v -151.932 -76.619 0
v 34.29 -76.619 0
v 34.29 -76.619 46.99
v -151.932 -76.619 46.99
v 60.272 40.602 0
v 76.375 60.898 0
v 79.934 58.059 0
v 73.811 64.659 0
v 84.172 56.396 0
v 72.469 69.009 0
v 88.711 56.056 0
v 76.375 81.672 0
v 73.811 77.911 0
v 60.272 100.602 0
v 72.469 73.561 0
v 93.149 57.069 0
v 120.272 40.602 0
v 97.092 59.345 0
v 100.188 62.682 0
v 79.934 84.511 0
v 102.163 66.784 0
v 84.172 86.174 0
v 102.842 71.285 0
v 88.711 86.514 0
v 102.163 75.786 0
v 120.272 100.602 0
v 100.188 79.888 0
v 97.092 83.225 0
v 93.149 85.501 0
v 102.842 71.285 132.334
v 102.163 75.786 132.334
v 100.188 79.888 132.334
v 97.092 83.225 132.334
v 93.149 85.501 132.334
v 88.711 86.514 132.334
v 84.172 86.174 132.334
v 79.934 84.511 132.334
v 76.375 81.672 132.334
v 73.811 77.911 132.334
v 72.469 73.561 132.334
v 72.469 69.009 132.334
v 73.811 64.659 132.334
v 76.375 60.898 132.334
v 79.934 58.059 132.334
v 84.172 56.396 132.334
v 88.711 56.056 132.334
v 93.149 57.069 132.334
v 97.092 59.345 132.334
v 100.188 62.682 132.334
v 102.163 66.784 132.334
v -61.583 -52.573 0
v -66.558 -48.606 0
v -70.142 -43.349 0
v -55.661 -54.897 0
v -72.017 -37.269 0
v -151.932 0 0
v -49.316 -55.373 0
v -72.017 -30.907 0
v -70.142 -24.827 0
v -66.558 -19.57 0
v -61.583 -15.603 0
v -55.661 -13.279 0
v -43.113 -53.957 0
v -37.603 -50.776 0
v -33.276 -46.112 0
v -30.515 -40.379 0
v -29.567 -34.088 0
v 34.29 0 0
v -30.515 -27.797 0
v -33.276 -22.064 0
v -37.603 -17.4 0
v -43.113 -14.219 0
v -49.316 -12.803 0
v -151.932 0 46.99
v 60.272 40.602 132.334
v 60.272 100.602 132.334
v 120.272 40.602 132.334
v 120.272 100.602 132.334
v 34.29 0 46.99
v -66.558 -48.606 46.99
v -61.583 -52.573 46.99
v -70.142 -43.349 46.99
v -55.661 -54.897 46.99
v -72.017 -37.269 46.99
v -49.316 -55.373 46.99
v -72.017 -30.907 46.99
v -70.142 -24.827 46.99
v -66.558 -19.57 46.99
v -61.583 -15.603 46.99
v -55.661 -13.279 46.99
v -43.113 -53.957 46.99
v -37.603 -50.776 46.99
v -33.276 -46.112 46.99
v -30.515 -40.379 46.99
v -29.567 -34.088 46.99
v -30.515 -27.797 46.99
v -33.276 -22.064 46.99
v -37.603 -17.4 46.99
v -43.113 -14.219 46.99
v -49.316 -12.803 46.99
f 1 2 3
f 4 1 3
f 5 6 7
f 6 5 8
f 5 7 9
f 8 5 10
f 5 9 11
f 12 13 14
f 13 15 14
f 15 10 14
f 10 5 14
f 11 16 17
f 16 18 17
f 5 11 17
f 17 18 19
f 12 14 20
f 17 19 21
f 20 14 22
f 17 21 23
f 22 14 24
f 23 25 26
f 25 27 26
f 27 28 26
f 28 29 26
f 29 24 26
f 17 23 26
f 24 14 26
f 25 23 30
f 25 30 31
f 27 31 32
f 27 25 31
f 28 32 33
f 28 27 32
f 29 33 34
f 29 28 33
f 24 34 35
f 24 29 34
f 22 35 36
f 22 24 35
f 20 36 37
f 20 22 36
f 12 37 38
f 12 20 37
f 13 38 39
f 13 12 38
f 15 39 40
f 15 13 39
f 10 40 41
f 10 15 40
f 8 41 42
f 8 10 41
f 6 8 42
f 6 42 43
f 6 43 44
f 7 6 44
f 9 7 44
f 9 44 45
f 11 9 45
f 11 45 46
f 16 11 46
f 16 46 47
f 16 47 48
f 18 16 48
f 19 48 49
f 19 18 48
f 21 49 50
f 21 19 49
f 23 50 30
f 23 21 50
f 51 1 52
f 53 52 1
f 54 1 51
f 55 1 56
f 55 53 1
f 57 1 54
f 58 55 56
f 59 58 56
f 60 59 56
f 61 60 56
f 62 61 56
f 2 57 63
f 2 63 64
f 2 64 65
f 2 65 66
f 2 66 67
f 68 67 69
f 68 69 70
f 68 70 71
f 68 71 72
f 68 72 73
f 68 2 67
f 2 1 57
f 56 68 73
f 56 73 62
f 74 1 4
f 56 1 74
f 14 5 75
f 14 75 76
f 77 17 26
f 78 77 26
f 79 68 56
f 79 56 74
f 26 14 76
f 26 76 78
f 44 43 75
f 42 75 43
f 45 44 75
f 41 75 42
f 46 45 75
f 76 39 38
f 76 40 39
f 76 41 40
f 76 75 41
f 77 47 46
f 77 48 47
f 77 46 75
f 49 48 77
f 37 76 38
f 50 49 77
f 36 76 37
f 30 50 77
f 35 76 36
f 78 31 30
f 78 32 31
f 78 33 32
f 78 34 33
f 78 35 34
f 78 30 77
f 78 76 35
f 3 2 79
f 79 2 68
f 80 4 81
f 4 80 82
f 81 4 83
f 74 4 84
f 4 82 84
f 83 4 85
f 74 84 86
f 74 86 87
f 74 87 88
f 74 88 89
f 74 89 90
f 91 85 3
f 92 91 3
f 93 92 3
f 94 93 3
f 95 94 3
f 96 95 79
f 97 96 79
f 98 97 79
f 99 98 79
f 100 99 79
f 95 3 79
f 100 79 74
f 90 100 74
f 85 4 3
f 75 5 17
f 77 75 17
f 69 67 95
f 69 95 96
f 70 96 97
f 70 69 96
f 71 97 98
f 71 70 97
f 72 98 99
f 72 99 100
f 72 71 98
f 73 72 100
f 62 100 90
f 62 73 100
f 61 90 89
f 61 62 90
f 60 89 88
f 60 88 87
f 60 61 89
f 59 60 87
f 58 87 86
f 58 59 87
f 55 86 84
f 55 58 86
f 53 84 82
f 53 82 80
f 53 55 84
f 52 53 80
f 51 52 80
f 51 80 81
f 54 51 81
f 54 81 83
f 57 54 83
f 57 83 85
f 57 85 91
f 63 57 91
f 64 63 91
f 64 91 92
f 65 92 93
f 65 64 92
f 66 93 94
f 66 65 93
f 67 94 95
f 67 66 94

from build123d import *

# Parameters (mm, degrees)
F0_W     = 93.0038541555
F0_H     = 76.6185969114
F0_R     = 21.3443090391
F1_DEPTH = 46.99
F2_DEPTH = 34.29
F3_DEPTH = 58.928
F4_W     = 60
F4_H     = 60
F4_R     = 15.2716118789
F5_DEPTH = 132.334


with BuildPart() as f1:
    # F0 (on Top) → F1 (new body)
    with BuildSketch(Plane.XY):
        with Locations((-46.5019270778, -38.3092984557)):
            Rectangle(F0_W, F0_H)
        with Locations((-50.9113110602, -34.0880826116)):
            Circle(F0_R, mode=Mode.SUBTRACT)
    extrude(amount=F1_DEPTH)

    # F2 (add): a face of the model
    f2_faces = [f1.faces().sort_by_distance(p)[0] for p in [
        (0, -38.3092984557, 23.495),
    ]]
    extrude(f2_faces, amount=F2_DEPTH)

    # F3 (add): a face of the model
    f3_faces = [f1.faces().sort_by_distance(p)[0] for p in [
        (-93.0038541555, -38.3092984557, 23.495),
    ]]
    extrude(f3_faces, amount=F3_DEPTH)


with BuildPart() as f5:
    # F4 (on Top) → F5 (new body)
    with BuildSketch(Plane.XY):
        with Locations((90.2718063444, 70.6015230619)):
            Rectangle(F4_W, F4_H)
        with Locations((87.5700501066, 71.2849623934)):
            Circle(F4_R, mode=Mode.SUBTRACT)
    extrude(amount=F5_DEPTH)


solid = Compound([f1.part, f5.part])
